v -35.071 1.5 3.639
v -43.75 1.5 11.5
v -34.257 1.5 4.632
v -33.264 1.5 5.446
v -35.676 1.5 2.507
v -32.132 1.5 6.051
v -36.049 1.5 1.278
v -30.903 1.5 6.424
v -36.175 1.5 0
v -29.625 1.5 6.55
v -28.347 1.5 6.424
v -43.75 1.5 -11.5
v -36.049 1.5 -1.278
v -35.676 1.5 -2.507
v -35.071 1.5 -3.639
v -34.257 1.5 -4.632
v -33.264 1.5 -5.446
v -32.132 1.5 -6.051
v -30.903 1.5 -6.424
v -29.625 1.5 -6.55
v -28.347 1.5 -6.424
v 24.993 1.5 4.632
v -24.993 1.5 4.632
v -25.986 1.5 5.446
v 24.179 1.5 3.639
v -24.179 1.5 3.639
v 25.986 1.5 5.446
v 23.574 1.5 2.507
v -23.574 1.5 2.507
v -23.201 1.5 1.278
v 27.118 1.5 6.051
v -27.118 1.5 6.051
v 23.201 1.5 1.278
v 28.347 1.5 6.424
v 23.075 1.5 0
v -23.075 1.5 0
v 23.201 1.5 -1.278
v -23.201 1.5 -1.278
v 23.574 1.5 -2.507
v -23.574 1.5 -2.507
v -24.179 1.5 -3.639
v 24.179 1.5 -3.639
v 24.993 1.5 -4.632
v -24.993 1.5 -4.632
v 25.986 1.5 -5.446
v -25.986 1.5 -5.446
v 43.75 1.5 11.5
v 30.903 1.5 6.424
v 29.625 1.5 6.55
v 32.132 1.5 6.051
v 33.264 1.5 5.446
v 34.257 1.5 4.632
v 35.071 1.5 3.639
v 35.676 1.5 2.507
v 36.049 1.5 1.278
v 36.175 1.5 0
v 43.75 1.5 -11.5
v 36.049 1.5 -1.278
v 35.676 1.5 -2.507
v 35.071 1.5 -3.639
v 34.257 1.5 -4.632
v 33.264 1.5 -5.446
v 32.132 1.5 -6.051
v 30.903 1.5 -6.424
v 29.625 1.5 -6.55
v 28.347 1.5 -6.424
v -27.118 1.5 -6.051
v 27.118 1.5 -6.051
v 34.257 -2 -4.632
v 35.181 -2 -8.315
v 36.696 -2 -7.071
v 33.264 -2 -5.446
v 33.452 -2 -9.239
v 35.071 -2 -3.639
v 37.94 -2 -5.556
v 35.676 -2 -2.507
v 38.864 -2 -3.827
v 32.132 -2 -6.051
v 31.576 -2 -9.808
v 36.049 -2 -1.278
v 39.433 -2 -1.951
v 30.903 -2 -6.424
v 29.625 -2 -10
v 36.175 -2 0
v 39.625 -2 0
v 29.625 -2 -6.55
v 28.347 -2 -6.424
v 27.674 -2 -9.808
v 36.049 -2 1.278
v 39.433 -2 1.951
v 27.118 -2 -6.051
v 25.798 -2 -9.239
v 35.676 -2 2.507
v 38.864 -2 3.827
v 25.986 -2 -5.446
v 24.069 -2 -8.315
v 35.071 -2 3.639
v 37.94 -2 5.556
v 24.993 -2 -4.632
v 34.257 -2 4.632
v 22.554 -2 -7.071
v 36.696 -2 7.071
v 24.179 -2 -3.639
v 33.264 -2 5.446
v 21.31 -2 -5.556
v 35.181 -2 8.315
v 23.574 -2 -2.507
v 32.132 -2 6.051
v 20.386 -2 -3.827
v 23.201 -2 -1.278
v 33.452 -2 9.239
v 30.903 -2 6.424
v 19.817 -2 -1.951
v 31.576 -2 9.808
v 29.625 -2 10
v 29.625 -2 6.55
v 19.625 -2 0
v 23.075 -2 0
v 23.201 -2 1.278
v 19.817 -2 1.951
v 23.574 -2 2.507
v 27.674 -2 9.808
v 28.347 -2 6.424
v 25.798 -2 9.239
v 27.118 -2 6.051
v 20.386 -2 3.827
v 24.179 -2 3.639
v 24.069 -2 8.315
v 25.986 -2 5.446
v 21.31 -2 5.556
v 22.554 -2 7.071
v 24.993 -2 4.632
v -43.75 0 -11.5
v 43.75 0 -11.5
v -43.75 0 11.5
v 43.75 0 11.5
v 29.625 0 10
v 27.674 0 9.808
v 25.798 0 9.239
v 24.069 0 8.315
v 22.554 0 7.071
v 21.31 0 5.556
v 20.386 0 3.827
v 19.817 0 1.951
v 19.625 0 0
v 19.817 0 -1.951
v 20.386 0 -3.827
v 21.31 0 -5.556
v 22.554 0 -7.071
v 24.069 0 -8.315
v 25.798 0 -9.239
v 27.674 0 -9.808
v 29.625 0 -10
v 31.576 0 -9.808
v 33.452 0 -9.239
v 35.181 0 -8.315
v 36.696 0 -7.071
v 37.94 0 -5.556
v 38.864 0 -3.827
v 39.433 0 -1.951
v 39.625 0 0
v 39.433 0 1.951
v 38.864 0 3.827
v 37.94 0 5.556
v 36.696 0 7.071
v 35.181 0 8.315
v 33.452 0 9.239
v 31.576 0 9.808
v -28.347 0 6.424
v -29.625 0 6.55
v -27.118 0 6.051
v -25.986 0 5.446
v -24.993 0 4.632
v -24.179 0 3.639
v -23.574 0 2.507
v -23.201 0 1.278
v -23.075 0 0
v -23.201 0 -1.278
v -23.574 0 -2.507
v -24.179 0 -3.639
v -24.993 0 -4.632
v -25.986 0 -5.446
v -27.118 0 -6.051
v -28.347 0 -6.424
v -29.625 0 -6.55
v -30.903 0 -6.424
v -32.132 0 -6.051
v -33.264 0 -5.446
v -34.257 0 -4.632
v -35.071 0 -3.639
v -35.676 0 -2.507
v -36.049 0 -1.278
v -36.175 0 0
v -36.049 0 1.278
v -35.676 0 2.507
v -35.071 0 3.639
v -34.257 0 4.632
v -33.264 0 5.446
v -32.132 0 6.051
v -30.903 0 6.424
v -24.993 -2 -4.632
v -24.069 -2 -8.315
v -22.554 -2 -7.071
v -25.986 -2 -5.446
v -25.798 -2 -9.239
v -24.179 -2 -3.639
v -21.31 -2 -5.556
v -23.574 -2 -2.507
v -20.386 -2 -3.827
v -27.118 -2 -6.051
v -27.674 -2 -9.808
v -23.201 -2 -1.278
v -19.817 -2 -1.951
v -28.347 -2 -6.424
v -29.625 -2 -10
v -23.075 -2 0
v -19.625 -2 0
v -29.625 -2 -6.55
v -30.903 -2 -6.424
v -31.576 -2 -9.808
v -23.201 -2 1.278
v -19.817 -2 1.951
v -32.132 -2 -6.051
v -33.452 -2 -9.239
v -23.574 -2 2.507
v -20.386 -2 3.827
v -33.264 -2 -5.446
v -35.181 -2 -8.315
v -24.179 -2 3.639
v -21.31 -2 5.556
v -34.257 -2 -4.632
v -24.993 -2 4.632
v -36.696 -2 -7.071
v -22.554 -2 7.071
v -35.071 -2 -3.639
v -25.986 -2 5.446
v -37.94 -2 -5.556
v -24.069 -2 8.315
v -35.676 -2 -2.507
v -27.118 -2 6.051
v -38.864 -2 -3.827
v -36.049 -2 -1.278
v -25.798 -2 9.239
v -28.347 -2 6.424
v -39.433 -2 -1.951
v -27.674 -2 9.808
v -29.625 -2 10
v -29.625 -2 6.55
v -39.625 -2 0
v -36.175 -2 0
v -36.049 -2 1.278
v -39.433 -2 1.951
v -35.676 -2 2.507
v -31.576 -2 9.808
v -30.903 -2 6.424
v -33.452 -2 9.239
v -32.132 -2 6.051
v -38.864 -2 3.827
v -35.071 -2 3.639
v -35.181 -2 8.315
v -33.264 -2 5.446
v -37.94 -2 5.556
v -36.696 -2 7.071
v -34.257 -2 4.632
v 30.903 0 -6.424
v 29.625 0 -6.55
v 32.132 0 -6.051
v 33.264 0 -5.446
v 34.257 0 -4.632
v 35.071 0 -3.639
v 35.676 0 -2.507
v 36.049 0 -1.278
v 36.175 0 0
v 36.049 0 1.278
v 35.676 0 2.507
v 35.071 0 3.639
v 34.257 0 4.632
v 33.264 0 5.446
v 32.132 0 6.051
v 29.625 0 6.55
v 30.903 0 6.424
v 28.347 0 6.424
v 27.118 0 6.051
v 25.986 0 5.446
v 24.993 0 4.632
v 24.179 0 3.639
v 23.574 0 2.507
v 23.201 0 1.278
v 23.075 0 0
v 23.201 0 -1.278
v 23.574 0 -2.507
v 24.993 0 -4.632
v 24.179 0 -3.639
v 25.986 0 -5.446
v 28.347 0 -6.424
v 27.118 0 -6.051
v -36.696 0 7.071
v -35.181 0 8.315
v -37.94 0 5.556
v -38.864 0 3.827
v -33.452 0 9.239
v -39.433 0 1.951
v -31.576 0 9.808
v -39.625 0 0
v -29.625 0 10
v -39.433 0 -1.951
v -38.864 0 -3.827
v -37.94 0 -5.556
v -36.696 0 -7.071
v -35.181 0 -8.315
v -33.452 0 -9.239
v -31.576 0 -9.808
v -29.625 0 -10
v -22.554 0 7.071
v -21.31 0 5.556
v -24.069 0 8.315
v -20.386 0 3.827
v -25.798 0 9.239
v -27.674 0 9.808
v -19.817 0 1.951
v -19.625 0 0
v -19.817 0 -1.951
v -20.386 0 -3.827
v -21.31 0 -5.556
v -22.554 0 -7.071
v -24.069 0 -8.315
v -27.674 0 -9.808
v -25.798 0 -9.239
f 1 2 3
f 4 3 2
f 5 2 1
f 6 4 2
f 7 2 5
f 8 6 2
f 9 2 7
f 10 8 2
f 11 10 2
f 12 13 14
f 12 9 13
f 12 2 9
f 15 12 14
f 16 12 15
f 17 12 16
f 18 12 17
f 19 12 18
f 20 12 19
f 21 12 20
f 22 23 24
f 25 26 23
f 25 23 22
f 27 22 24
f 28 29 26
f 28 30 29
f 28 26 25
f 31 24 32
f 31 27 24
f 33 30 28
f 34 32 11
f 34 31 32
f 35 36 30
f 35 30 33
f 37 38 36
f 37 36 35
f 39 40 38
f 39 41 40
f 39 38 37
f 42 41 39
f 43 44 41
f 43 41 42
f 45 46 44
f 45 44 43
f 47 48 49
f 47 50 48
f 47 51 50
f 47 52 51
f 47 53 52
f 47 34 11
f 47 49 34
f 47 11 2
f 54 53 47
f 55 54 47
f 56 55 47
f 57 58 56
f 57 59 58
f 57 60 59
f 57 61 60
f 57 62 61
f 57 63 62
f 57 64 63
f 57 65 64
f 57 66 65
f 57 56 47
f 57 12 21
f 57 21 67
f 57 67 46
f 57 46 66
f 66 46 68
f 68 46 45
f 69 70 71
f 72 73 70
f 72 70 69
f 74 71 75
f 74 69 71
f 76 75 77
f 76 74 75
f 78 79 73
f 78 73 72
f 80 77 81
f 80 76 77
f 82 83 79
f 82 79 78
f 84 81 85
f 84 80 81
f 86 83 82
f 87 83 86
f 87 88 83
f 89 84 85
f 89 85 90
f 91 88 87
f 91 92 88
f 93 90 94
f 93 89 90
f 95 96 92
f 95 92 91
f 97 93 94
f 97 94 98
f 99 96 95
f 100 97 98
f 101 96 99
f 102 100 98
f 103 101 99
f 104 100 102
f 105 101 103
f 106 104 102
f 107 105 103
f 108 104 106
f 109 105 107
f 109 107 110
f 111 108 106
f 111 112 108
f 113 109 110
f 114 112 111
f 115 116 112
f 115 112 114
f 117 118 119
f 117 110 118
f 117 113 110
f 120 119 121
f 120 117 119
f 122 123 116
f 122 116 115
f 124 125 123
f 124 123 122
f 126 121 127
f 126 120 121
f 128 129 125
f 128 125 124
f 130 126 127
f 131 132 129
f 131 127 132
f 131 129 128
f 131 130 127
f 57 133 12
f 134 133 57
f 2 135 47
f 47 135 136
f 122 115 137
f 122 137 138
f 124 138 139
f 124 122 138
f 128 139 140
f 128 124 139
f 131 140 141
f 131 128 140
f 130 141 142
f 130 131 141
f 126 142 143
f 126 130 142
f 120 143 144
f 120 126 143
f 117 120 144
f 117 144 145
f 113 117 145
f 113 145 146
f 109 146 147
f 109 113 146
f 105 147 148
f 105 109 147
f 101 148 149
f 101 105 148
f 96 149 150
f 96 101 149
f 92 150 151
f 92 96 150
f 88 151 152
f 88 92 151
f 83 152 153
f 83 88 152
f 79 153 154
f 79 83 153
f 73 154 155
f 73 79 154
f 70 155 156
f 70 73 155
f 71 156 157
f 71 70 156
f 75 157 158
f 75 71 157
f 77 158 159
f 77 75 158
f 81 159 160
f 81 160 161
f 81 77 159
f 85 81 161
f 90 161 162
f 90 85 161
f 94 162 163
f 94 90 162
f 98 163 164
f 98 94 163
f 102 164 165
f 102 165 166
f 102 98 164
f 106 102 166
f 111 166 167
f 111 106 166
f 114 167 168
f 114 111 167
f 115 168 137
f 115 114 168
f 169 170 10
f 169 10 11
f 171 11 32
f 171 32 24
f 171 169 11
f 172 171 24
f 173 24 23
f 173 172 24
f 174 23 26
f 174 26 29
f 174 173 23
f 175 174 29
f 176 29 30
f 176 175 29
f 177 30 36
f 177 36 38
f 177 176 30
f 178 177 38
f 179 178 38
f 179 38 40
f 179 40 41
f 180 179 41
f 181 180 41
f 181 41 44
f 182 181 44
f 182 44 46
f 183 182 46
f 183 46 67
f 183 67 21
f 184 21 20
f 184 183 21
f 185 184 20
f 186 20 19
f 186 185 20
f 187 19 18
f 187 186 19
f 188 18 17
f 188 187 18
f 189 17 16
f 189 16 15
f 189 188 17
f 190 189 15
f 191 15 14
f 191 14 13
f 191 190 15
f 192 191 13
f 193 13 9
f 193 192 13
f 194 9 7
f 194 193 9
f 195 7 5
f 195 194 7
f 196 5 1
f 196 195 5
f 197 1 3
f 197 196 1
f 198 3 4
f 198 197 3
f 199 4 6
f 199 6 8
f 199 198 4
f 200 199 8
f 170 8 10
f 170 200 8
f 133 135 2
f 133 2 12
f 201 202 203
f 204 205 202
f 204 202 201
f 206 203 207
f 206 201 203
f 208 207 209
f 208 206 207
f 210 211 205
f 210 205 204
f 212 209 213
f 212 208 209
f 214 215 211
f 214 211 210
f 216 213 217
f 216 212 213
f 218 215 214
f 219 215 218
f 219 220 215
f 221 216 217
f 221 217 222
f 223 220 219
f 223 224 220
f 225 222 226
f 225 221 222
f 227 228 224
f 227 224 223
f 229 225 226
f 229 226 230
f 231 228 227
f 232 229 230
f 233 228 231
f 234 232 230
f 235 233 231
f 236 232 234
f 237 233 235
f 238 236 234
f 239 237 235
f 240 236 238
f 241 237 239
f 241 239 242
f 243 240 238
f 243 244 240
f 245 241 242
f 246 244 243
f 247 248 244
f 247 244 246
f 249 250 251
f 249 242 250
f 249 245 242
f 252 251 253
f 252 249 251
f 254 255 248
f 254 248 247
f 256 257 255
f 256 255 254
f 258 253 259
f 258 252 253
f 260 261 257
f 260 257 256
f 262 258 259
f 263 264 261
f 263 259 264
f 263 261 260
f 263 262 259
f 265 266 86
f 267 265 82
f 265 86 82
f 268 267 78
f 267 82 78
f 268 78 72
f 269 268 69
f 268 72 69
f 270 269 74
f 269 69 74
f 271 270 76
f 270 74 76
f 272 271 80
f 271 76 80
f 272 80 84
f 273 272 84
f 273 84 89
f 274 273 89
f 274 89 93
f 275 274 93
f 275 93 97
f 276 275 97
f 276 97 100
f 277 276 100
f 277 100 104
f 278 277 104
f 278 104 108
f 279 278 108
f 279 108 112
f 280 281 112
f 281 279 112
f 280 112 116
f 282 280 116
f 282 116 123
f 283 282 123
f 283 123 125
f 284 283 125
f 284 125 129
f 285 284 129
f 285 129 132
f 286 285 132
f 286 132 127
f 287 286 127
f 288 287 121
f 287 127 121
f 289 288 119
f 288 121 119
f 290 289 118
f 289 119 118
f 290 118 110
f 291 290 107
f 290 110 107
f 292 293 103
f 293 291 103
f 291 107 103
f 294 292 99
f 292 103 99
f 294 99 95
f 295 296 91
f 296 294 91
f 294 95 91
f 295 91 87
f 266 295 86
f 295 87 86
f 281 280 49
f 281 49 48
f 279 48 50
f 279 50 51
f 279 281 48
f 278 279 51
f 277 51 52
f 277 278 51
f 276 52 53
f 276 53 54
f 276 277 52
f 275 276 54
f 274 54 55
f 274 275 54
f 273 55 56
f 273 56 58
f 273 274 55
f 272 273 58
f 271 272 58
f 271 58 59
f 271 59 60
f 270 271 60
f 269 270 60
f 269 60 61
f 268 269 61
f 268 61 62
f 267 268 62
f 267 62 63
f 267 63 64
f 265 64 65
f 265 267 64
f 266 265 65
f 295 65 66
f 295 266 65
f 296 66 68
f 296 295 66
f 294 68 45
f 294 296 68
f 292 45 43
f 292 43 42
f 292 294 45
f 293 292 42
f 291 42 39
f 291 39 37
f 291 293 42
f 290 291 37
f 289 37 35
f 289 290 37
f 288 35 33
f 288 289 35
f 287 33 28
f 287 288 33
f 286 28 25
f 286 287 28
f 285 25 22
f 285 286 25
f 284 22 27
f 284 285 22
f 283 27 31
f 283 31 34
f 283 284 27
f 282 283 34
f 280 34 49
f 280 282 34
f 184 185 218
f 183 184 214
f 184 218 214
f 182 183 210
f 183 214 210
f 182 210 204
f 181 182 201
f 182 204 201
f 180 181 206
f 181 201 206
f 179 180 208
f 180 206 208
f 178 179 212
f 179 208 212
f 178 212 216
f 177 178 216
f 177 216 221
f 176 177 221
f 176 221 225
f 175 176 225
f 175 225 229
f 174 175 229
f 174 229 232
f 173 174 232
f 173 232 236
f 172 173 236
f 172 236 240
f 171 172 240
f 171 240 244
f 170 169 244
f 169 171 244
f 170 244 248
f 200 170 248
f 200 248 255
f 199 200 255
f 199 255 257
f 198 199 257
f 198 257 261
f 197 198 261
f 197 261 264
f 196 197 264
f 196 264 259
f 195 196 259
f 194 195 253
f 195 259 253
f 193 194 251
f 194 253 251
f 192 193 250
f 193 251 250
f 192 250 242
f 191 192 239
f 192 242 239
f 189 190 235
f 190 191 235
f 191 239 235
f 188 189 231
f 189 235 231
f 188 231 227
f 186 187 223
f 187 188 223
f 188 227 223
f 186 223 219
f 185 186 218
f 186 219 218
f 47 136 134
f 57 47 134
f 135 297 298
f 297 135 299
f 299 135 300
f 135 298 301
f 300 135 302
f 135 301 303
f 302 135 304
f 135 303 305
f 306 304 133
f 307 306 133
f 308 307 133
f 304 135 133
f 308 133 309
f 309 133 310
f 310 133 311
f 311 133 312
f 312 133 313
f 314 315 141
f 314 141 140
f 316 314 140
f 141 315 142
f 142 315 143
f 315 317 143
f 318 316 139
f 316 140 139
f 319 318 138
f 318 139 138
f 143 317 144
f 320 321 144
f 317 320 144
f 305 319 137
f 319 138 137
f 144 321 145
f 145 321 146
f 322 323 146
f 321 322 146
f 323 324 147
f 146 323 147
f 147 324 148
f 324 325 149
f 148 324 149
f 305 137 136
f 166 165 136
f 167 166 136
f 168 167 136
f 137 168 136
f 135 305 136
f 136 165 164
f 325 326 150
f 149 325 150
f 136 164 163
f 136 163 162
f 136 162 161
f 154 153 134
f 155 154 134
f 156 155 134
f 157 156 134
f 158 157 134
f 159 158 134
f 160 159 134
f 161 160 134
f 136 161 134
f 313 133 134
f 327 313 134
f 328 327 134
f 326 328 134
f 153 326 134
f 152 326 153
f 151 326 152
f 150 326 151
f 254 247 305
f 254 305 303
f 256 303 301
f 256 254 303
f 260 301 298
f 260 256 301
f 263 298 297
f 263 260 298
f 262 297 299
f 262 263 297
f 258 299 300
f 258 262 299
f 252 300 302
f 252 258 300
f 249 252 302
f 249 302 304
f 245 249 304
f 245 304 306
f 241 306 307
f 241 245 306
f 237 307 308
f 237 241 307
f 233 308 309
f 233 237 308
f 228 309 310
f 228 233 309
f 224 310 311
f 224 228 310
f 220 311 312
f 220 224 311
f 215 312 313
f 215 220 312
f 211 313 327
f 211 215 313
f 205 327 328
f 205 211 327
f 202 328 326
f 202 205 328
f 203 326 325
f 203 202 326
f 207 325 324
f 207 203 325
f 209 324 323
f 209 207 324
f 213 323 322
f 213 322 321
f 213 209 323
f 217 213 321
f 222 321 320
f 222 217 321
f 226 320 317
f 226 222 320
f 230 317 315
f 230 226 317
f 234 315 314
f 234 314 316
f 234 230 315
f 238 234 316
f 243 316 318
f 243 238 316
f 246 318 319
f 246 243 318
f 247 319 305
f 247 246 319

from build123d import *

# Parameters (mm, degrees)
SKETCH1_W           = 87.5
SKETCH1_H           = 23
SKETCH1_R           = 6.55
BOSS_EXTRUDE1_DEPTH = 1.5
BOSS_EXTRUDE2_START = 2
SKETCH2_R           = 10
SKETCH2_R_2         = 6.55
BOSS_EXTRUDE2_DEPTH = 2


with BuildPart() as part:
    # Sketch1 → Boss-Extrude1 (new body)
    with BuildSketch(Plane(origin=(0, 0, 0), x_dir=(1, 0, 0), z_dir=(0, 1, 0))):
        Rectangle(SKETCH1_W, SKETCH1_H)
        with Locations((-29.625, 0)):
            Circle(SKETCH1_R, mode=Mode.SUBTRACT)
        with Locations((29.625, 0)):
            Circle(SKETCH1_R, mode=Mode.SUBTRACT)
    extrude(amount=BOSS_EXTRUDE1_DEPTH)

    # Sketch2 → Boss-Extrude2 (add)
    # profile 1 of 2: a face of its own
    with BuildSketch(Plane.XZ.offset(BOSS_EXTRUDE2_START)):
        with Locations((-29.625, 0)):
            Circle(SKETCH2_R)
        with Locations((-29.625, 0)):
            Circle(SKETCH2_R_2, mode=Mode.SUBTRACT)
    # profile 2 of 2: a face of its own
    with BuildSketch(Plane.XZ.offset(BOSS_EXTRUDE2_START)):
        with Locations((29.625, 0)):
            Circle(SKETCH2_R)
        with Locations((29.625, 0)):
            Circle(SKETCH2_R_2, mode=Mode.SUBTRACT)
    extrude(amount=-BOSS_EXTRUDE2_DEPTH)


solid = part.part
